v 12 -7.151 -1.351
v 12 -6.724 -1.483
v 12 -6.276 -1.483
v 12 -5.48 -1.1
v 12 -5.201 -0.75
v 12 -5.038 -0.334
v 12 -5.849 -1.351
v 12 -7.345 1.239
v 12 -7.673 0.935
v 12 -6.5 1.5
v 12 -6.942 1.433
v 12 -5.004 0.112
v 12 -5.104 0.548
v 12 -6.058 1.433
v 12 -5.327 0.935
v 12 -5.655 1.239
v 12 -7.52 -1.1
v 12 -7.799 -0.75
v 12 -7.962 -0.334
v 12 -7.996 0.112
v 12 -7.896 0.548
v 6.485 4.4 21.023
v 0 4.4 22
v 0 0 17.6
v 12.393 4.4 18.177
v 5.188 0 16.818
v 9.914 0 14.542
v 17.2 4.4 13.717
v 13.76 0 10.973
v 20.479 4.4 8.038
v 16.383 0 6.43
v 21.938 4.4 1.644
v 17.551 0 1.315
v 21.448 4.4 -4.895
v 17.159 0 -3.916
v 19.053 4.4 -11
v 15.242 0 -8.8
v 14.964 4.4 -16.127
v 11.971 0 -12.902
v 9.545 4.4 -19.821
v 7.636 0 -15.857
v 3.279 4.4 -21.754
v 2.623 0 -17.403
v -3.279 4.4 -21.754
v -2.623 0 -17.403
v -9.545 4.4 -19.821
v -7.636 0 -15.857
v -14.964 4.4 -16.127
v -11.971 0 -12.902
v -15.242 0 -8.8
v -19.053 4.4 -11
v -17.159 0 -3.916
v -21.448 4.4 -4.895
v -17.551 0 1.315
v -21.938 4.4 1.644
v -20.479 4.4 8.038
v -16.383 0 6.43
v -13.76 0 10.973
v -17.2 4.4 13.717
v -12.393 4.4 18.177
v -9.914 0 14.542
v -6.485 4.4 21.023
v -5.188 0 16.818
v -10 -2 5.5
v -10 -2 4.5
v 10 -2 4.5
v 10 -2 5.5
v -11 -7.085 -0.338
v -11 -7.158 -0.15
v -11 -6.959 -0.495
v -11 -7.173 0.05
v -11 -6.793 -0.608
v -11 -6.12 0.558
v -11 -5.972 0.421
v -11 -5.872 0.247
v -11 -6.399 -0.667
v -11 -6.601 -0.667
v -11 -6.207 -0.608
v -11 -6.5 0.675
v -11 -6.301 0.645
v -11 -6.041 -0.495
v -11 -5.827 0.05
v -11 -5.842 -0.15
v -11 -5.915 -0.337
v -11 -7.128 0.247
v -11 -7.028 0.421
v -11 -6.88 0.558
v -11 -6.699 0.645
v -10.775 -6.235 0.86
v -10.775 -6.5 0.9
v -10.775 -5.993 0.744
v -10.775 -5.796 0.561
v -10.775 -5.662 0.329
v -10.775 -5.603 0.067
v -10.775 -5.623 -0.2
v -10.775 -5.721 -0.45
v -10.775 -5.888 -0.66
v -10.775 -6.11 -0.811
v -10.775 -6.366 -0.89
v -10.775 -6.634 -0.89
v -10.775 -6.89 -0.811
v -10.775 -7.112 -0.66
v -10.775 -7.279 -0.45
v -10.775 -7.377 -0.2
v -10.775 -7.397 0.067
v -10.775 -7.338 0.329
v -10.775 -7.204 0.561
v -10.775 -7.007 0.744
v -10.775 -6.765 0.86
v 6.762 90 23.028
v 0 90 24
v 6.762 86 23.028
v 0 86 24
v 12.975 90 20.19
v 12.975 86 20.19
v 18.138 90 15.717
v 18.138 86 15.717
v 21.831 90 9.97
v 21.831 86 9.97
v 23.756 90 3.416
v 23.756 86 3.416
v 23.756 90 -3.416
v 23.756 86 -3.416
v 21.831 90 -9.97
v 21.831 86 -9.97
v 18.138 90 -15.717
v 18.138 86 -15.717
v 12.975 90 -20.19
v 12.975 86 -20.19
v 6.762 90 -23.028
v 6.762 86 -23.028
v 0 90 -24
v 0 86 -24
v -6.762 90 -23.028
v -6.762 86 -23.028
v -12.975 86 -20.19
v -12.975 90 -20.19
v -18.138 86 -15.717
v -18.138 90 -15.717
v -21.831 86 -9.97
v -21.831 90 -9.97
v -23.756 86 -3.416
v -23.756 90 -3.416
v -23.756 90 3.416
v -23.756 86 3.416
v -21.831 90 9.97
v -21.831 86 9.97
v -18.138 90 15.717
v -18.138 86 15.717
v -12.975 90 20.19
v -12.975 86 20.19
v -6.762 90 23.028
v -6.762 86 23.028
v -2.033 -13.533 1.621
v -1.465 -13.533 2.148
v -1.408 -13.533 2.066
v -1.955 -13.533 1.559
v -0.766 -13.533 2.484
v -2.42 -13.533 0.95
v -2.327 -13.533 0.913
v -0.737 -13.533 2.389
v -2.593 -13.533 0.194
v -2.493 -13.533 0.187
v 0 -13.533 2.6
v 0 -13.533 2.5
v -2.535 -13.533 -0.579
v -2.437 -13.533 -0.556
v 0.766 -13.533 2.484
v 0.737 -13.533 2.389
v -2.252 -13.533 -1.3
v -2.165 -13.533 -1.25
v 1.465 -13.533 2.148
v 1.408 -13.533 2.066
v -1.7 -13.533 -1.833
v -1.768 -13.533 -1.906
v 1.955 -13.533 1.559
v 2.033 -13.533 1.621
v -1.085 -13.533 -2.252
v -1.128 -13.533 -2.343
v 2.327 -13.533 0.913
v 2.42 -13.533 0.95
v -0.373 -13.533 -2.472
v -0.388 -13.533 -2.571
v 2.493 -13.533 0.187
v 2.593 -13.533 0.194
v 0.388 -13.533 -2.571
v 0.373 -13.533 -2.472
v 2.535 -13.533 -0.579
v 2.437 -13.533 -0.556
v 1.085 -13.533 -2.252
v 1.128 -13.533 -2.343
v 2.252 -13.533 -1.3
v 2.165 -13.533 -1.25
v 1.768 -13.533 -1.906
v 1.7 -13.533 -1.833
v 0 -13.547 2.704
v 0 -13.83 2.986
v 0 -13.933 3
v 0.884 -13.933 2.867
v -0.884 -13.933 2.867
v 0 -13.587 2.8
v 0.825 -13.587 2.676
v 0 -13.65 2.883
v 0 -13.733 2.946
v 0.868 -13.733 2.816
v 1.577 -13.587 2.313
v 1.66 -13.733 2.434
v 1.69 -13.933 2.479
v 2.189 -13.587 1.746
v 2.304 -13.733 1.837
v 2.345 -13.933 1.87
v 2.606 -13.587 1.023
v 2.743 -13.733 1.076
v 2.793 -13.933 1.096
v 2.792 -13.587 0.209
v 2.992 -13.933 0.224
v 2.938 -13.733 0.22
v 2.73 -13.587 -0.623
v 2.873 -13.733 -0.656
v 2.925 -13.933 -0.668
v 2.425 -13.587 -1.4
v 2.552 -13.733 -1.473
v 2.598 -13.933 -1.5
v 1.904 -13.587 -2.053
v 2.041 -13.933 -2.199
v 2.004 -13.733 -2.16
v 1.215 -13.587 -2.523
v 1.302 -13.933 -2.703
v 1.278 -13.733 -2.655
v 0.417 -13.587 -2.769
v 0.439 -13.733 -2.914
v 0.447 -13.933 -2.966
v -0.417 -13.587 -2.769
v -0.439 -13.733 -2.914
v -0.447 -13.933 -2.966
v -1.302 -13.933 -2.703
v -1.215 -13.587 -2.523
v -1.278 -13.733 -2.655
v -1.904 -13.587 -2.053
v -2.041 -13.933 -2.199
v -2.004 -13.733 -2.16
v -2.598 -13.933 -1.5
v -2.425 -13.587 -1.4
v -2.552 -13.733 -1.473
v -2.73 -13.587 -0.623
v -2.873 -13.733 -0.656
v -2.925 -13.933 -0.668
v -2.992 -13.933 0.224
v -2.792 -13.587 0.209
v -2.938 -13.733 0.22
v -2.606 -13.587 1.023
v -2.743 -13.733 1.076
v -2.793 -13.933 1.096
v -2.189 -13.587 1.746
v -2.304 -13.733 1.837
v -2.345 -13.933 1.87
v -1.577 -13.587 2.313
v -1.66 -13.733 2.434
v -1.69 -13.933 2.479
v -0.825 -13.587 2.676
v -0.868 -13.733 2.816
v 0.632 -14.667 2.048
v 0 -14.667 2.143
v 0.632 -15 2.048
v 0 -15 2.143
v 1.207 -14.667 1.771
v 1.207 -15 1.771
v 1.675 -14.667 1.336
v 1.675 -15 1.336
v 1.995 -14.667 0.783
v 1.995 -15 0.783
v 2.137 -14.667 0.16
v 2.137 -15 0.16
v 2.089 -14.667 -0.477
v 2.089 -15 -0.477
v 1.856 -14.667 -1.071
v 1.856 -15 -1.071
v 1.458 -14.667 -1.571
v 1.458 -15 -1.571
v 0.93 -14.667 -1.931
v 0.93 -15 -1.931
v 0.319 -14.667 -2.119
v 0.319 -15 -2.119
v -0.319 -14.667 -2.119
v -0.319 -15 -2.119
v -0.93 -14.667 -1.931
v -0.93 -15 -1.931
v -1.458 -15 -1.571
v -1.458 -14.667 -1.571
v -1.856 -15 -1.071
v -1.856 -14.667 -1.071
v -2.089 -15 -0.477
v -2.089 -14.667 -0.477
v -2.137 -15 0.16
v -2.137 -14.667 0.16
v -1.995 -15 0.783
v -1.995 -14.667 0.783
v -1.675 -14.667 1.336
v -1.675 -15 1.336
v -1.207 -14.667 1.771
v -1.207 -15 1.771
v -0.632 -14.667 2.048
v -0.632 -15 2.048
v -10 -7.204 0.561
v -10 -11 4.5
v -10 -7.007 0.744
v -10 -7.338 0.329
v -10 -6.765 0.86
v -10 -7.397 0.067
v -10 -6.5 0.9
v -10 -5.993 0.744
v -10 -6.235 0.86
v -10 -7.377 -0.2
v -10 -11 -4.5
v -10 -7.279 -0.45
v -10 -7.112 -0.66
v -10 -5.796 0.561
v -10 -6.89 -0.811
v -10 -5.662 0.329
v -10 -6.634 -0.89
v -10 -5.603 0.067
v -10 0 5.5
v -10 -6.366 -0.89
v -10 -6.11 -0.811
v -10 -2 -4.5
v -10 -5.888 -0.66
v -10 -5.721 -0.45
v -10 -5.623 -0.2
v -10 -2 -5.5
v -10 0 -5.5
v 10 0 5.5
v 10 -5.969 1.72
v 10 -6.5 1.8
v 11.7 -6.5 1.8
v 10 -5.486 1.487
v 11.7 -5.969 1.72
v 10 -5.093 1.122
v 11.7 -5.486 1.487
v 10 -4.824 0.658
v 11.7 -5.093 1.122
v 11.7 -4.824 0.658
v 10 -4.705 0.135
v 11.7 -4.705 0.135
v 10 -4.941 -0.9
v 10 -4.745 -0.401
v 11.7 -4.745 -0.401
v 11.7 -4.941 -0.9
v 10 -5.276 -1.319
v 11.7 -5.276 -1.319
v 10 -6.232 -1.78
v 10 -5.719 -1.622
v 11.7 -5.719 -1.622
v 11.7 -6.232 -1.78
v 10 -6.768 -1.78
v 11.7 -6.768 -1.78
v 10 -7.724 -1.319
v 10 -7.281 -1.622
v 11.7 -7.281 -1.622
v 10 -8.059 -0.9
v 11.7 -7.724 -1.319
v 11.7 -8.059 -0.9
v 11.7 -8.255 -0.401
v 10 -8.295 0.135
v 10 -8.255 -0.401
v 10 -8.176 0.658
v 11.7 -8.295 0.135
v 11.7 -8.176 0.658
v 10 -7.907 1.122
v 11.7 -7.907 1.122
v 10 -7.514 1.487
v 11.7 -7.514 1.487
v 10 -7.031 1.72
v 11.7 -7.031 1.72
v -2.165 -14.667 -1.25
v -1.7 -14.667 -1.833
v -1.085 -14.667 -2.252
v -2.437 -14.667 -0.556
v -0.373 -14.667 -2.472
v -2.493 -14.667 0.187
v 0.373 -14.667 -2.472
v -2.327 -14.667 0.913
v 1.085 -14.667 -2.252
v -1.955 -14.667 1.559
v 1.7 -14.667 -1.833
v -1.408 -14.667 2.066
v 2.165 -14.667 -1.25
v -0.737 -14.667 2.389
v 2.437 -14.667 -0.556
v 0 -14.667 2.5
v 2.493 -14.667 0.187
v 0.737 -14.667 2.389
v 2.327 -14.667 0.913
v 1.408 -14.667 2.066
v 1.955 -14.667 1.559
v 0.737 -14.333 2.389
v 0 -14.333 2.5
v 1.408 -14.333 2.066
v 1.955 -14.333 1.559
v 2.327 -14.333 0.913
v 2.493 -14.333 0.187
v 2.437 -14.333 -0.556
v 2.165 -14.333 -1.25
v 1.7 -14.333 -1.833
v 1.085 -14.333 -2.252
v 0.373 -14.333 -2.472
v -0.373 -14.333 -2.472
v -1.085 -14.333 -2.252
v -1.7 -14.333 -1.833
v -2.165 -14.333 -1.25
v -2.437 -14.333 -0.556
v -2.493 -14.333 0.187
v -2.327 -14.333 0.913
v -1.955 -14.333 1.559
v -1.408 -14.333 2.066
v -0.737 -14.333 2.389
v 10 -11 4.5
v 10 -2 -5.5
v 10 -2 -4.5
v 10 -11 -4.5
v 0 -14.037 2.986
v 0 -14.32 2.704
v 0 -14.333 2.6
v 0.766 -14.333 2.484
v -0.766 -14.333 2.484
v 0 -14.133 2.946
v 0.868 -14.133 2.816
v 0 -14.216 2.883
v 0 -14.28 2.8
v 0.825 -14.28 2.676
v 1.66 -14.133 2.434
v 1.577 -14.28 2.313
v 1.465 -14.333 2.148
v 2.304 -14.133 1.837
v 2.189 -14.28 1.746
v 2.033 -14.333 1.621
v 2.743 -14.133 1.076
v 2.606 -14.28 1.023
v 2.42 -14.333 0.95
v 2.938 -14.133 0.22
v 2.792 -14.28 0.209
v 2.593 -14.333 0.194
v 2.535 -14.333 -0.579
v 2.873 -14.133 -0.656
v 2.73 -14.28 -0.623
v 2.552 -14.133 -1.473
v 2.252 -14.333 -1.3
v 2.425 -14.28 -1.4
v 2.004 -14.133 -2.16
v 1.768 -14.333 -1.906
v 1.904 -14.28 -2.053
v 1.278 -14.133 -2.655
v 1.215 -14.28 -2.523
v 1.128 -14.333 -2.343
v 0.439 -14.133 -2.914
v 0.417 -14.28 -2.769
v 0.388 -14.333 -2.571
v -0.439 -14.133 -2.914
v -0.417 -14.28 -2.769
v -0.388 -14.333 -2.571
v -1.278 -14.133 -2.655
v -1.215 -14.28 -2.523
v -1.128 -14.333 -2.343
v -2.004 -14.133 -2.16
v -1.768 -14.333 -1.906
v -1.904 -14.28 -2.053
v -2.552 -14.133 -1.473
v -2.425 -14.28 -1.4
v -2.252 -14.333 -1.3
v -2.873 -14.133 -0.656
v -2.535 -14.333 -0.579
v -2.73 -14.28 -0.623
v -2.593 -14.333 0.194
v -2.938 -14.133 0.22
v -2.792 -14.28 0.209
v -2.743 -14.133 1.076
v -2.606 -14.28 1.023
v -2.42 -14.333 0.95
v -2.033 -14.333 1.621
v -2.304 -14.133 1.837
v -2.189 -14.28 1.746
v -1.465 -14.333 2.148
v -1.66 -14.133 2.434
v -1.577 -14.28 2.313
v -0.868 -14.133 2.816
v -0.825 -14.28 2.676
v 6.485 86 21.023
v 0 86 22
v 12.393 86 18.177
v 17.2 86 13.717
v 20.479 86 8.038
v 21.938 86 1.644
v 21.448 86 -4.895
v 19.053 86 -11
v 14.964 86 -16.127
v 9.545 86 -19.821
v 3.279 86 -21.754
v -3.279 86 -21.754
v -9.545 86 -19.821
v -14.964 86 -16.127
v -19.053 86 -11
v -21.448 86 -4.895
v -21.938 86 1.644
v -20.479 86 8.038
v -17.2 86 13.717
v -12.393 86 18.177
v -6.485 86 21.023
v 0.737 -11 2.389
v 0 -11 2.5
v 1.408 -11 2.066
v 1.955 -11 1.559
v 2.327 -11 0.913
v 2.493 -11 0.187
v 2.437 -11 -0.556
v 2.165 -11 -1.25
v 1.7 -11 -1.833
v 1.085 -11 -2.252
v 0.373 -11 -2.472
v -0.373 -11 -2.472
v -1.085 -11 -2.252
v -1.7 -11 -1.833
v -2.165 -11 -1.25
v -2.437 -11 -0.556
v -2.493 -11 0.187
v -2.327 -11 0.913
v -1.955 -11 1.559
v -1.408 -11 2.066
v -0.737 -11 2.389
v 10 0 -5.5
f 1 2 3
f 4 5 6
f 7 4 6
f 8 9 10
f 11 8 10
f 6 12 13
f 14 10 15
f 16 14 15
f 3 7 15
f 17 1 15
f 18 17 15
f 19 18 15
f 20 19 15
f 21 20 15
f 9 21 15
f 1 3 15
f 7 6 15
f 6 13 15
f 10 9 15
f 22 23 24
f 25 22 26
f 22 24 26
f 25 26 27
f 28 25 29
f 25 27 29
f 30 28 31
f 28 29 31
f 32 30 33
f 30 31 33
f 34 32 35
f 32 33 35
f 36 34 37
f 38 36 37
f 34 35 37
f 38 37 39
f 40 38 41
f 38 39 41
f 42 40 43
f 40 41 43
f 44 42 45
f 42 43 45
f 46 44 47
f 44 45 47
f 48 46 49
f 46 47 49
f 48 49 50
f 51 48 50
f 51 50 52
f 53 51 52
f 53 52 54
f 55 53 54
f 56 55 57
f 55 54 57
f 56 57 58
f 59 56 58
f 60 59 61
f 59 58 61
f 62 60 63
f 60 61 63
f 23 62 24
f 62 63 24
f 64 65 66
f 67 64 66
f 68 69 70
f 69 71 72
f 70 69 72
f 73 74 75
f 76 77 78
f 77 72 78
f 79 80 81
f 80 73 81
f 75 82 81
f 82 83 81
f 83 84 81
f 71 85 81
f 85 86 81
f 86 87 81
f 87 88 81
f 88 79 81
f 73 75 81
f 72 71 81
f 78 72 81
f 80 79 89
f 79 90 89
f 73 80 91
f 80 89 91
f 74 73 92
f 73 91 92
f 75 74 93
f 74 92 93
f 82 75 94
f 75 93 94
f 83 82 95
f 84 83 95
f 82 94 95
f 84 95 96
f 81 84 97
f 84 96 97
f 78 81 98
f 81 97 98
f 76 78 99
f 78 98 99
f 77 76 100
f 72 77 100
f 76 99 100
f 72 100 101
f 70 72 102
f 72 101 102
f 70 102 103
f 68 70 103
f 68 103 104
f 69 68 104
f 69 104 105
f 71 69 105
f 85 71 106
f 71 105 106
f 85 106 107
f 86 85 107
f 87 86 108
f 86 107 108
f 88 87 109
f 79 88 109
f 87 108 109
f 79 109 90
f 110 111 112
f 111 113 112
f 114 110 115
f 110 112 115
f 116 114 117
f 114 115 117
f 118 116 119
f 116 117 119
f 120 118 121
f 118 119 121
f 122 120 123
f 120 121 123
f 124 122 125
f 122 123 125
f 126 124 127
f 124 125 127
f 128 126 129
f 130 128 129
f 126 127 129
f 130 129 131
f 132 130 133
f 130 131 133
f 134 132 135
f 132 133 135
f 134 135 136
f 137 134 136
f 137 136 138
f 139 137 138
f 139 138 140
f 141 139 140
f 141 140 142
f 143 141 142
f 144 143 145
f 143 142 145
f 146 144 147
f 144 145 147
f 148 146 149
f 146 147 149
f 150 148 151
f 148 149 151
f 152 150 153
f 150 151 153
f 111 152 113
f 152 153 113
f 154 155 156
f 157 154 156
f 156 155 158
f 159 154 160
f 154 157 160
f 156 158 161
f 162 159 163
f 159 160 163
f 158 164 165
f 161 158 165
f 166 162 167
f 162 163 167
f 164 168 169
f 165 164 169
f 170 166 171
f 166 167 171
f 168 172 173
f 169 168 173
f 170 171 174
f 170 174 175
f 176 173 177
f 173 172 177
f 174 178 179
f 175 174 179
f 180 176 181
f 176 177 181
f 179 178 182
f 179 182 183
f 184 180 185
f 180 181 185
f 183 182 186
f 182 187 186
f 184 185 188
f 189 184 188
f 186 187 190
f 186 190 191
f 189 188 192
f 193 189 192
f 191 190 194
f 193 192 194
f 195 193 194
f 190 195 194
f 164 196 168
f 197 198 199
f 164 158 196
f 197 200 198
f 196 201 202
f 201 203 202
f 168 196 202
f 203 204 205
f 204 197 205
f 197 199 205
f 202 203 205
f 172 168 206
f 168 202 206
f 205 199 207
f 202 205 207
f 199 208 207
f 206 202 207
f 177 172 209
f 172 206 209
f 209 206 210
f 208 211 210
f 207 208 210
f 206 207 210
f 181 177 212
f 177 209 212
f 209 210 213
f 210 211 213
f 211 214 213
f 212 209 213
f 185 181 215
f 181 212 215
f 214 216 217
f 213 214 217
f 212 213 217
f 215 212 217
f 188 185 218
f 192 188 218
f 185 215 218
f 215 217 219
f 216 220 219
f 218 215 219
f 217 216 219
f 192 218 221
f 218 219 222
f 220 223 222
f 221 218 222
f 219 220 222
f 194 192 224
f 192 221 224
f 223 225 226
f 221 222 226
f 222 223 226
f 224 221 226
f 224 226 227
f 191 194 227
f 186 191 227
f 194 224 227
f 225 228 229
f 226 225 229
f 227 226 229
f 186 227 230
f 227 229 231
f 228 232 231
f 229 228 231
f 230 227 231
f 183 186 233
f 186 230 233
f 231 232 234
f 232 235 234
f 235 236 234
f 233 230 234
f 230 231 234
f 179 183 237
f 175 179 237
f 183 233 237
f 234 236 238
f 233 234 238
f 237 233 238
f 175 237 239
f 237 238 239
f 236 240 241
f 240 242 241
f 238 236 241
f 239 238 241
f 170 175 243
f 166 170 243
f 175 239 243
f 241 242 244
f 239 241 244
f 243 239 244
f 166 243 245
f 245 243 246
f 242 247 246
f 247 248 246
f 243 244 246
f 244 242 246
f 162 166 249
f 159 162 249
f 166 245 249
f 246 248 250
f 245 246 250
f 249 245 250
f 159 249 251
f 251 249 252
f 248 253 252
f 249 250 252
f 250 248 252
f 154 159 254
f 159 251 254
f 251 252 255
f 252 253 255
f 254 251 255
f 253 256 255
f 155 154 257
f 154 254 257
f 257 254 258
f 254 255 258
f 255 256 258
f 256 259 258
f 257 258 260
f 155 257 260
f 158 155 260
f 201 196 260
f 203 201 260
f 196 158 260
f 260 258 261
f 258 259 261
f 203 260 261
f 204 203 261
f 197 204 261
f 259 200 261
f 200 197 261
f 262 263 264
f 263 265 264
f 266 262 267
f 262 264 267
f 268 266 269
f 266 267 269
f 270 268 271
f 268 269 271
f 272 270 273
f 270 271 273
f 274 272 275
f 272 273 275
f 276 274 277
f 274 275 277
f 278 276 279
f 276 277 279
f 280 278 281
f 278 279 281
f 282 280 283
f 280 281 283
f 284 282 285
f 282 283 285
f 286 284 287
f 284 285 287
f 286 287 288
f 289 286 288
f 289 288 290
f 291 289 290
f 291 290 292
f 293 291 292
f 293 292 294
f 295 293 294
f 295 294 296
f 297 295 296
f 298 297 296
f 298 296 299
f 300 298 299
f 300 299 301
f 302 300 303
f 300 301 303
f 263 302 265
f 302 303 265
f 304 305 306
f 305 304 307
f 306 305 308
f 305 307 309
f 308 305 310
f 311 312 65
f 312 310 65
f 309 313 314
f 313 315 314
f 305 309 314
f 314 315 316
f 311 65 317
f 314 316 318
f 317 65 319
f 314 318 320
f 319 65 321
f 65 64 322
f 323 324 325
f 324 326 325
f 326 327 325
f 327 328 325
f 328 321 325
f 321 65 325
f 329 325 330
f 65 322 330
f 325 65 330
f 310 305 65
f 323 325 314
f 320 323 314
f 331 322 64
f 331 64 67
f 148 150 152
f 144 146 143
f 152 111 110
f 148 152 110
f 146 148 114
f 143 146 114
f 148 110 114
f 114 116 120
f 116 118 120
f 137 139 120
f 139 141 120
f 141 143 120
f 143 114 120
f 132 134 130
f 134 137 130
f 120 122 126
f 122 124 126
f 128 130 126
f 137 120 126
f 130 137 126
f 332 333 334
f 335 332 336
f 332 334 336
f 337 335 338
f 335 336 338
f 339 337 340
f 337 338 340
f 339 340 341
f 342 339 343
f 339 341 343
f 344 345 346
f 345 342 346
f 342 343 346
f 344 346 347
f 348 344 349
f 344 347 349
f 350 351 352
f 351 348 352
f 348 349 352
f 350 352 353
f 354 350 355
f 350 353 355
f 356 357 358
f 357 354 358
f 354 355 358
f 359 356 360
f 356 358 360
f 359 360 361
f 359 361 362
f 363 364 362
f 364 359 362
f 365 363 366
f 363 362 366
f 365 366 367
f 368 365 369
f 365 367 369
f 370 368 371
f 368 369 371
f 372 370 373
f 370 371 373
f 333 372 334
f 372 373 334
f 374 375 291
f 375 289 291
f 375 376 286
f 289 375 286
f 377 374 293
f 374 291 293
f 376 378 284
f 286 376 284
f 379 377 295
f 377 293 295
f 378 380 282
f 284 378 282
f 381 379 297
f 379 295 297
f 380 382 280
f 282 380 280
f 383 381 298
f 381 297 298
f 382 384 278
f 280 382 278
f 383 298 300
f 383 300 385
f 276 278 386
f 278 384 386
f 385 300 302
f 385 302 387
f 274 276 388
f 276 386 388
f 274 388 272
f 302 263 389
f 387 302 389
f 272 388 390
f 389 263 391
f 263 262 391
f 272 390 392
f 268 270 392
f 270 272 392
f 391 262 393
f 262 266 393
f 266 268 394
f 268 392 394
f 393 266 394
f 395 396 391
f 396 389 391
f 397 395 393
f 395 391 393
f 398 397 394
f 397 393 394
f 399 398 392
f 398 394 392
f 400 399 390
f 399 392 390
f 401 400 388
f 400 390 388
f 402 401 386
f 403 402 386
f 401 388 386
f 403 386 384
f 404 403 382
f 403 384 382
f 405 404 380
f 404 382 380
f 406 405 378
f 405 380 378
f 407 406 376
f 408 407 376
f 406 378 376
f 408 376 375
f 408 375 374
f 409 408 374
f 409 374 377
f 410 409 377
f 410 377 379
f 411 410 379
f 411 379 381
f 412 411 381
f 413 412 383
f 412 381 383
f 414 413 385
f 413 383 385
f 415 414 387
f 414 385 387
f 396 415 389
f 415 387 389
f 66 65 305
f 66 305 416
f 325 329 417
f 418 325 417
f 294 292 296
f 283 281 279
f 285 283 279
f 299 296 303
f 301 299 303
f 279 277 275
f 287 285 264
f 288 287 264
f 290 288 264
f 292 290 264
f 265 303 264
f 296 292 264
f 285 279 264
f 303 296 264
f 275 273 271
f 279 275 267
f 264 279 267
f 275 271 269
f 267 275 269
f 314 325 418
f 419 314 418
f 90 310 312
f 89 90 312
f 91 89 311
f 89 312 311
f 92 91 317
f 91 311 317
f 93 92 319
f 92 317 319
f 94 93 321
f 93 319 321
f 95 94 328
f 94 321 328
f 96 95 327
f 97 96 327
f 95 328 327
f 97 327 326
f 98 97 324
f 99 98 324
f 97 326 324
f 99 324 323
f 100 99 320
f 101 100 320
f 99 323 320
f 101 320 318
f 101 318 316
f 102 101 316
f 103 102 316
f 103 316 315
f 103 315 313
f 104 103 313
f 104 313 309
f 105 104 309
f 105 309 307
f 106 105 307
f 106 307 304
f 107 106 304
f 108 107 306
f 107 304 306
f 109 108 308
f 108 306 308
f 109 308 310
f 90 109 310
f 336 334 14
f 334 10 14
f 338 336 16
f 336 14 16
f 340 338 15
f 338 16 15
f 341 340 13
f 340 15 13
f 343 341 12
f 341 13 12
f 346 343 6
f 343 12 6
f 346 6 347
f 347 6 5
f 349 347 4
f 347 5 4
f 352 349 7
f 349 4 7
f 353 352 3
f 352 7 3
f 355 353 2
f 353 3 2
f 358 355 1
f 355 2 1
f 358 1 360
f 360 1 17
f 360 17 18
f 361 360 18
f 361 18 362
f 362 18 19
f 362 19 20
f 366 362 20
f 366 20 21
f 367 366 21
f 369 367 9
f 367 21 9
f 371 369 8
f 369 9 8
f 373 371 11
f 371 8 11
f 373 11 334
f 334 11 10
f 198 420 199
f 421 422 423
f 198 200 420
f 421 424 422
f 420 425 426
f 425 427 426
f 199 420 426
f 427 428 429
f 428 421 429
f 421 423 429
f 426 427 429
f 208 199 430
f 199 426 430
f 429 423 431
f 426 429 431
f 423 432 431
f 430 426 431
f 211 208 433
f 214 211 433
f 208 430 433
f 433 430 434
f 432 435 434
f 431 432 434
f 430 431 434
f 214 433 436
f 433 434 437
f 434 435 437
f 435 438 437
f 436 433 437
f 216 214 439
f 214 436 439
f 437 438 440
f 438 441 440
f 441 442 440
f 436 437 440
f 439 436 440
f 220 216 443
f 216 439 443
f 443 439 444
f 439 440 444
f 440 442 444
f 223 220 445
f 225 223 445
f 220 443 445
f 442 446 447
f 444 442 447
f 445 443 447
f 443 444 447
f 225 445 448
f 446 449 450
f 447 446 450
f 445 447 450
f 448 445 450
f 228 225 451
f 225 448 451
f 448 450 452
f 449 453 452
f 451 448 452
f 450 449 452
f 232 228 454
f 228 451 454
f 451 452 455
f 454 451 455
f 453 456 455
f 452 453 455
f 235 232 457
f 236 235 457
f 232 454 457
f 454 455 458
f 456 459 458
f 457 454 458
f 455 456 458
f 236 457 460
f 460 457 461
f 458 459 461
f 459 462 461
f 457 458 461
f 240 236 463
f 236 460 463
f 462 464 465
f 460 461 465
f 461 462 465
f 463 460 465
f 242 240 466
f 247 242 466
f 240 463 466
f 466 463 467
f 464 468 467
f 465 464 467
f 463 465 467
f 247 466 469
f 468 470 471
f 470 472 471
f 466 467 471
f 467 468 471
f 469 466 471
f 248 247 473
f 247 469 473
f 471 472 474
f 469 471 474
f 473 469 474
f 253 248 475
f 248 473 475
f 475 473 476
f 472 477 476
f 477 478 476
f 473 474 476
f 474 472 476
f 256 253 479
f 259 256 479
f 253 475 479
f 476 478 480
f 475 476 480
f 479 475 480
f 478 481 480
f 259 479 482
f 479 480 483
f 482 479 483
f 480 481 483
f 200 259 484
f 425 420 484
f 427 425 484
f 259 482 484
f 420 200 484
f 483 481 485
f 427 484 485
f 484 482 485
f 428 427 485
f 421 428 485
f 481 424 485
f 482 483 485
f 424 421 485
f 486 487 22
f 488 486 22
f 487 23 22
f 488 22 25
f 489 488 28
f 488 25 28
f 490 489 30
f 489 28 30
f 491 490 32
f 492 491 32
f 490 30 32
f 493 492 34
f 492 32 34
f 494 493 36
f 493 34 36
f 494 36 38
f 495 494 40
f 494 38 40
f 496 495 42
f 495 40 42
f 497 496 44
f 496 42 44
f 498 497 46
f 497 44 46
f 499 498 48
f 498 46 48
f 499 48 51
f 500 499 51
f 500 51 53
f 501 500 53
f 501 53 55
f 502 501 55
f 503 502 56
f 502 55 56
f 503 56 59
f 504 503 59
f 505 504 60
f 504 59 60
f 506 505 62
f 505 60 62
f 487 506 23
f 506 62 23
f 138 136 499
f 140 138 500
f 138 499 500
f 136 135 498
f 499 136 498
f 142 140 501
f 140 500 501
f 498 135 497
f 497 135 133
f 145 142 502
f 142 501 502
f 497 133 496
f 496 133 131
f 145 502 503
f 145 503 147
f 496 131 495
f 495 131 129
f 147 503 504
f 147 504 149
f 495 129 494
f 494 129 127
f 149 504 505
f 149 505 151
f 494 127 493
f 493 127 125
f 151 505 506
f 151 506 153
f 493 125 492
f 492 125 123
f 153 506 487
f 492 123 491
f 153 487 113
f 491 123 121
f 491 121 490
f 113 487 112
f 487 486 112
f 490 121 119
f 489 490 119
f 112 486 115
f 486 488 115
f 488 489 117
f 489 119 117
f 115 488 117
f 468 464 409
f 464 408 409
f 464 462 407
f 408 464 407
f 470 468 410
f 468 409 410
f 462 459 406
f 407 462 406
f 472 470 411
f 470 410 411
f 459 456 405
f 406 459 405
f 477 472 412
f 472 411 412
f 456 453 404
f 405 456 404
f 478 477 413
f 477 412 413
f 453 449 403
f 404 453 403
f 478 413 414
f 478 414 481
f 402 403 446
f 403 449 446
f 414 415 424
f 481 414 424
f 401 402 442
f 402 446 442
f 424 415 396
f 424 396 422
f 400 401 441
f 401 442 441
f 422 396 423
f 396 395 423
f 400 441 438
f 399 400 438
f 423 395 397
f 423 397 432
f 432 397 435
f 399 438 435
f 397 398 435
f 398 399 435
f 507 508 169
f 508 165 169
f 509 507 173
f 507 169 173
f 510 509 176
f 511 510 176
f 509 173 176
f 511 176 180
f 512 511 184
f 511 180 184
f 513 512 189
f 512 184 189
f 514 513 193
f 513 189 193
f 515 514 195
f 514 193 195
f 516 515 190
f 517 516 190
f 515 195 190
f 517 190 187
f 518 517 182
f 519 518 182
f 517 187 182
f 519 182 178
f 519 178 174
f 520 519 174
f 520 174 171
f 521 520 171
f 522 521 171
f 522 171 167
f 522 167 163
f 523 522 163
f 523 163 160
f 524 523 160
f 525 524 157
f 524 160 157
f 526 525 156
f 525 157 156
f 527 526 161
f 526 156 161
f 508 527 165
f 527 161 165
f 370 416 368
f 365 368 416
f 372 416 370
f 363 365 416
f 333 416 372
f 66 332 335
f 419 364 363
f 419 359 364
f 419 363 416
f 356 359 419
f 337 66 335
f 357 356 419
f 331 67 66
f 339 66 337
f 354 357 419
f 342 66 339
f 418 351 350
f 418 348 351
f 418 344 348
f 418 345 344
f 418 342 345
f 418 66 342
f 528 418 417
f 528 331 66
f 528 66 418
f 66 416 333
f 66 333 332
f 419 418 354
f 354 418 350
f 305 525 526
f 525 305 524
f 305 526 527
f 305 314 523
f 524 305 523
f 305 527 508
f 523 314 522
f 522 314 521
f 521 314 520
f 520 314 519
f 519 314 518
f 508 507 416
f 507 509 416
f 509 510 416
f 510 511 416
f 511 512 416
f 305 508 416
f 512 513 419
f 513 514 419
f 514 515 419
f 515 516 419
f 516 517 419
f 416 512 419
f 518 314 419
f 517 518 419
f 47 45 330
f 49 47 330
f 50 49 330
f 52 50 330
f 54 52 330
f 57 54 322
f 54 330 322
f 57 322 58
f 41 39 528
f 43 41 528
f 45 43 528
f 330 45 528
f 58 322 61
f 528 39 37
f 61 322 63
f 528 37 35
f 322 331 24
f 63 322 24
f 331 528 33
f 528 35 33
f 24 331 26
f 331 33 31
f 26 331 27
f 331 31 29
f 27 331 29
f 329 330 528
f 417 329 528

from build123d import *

# Parameters (mm, degrees)
SKETCH_2_W      = 20
SKETCH_2_H      = 9
EXTRUDE_1_DEPTH = 11
SKETCH_3_W      = 20
SKETCH_3_H      = 11
EXTRUDE_2_DEPTH = 2


with BuildPart() as part:
    # 草图1 → 旋转1 (revolve)
    with BuildSketch(Plane.XY):
        Polygon((0, 90), (24, 90), (24, 86), (22, 86), (22, 4.4), (17.6, 0), (0, 0), align=None)
    revolve(axis=Axis((0, 0, 0), (0, 1, 0)))

    # 草图2 → 凸台-拉伸1 (add)
    with BuildSketch(Plane(origin=(0, 0, 0), x_dir=(1, 0, 0), z_dir=(0, 1, 0))):
        Rectangle(SKETCH_2_W, SKETCH_2_H)
    extrude(amount=-EXTRUDE_1_DEPTH)

    # 草图3 → 凸台-拉伸2 (add)
    with BuildSketch(Plane(origin=(0, 0, 0), x_dir=(1, 0, 0), z_dir=(0, 1, 0))):
        Rectangle(SKETCH_3_W, SKETCH_3_H)
    extrude(amount=-EXTRUDE_2_DEPTH)

    # 草图4 → 旋转2 (revolve)
    with BuildSketch(Plane.XY):
        with BuildLine():
            Line((0, -11), (2.5, -11))
            Line((2.5, -11), (2.5, -13.533333333))
            Line((2.5, -13.533333333), (2.6, -13.533333333))
            ThreePointArc((2.6, -13.533333333), (2.882842712, -13.650490621), (3, -13.933333333))
            ThreePointArc((3, -13.933333333), (2.882842712, -14.216176046), (2.6, -14.333333333))
            Line((2.6, -14.333333333), (2.5, -14.333333333))
            Line((2.5, -14.333333333), (2.5, -14.666666667))
            Line((2.5, -14.666666667), (2.142857143, -14.666666667))
            Line((2.142857143, -14.666666667), (2.142857143, -15))
            Line((2.142857143, -15), (0, -15))
            Line((0, -15), (0, -11))
        make_face()
    revolve(axis=Axis((0, -15, 0), (0, 1, 0)))

    # 草图5 → 旋转3 (revolve)
    with BuildSketch(Plane.XY):
        Polygon((-11, -6.5), (-11, -5.825), (-10.775, -5.6), (9.5, -5.6), (9.5, -4.7), (11.7, -4.7), (12, -5), (12, -6.5), align=None)
    revolve(axis=Axis((12, -6.5, 0), (-1, 0, 0)))


solid = part.part
